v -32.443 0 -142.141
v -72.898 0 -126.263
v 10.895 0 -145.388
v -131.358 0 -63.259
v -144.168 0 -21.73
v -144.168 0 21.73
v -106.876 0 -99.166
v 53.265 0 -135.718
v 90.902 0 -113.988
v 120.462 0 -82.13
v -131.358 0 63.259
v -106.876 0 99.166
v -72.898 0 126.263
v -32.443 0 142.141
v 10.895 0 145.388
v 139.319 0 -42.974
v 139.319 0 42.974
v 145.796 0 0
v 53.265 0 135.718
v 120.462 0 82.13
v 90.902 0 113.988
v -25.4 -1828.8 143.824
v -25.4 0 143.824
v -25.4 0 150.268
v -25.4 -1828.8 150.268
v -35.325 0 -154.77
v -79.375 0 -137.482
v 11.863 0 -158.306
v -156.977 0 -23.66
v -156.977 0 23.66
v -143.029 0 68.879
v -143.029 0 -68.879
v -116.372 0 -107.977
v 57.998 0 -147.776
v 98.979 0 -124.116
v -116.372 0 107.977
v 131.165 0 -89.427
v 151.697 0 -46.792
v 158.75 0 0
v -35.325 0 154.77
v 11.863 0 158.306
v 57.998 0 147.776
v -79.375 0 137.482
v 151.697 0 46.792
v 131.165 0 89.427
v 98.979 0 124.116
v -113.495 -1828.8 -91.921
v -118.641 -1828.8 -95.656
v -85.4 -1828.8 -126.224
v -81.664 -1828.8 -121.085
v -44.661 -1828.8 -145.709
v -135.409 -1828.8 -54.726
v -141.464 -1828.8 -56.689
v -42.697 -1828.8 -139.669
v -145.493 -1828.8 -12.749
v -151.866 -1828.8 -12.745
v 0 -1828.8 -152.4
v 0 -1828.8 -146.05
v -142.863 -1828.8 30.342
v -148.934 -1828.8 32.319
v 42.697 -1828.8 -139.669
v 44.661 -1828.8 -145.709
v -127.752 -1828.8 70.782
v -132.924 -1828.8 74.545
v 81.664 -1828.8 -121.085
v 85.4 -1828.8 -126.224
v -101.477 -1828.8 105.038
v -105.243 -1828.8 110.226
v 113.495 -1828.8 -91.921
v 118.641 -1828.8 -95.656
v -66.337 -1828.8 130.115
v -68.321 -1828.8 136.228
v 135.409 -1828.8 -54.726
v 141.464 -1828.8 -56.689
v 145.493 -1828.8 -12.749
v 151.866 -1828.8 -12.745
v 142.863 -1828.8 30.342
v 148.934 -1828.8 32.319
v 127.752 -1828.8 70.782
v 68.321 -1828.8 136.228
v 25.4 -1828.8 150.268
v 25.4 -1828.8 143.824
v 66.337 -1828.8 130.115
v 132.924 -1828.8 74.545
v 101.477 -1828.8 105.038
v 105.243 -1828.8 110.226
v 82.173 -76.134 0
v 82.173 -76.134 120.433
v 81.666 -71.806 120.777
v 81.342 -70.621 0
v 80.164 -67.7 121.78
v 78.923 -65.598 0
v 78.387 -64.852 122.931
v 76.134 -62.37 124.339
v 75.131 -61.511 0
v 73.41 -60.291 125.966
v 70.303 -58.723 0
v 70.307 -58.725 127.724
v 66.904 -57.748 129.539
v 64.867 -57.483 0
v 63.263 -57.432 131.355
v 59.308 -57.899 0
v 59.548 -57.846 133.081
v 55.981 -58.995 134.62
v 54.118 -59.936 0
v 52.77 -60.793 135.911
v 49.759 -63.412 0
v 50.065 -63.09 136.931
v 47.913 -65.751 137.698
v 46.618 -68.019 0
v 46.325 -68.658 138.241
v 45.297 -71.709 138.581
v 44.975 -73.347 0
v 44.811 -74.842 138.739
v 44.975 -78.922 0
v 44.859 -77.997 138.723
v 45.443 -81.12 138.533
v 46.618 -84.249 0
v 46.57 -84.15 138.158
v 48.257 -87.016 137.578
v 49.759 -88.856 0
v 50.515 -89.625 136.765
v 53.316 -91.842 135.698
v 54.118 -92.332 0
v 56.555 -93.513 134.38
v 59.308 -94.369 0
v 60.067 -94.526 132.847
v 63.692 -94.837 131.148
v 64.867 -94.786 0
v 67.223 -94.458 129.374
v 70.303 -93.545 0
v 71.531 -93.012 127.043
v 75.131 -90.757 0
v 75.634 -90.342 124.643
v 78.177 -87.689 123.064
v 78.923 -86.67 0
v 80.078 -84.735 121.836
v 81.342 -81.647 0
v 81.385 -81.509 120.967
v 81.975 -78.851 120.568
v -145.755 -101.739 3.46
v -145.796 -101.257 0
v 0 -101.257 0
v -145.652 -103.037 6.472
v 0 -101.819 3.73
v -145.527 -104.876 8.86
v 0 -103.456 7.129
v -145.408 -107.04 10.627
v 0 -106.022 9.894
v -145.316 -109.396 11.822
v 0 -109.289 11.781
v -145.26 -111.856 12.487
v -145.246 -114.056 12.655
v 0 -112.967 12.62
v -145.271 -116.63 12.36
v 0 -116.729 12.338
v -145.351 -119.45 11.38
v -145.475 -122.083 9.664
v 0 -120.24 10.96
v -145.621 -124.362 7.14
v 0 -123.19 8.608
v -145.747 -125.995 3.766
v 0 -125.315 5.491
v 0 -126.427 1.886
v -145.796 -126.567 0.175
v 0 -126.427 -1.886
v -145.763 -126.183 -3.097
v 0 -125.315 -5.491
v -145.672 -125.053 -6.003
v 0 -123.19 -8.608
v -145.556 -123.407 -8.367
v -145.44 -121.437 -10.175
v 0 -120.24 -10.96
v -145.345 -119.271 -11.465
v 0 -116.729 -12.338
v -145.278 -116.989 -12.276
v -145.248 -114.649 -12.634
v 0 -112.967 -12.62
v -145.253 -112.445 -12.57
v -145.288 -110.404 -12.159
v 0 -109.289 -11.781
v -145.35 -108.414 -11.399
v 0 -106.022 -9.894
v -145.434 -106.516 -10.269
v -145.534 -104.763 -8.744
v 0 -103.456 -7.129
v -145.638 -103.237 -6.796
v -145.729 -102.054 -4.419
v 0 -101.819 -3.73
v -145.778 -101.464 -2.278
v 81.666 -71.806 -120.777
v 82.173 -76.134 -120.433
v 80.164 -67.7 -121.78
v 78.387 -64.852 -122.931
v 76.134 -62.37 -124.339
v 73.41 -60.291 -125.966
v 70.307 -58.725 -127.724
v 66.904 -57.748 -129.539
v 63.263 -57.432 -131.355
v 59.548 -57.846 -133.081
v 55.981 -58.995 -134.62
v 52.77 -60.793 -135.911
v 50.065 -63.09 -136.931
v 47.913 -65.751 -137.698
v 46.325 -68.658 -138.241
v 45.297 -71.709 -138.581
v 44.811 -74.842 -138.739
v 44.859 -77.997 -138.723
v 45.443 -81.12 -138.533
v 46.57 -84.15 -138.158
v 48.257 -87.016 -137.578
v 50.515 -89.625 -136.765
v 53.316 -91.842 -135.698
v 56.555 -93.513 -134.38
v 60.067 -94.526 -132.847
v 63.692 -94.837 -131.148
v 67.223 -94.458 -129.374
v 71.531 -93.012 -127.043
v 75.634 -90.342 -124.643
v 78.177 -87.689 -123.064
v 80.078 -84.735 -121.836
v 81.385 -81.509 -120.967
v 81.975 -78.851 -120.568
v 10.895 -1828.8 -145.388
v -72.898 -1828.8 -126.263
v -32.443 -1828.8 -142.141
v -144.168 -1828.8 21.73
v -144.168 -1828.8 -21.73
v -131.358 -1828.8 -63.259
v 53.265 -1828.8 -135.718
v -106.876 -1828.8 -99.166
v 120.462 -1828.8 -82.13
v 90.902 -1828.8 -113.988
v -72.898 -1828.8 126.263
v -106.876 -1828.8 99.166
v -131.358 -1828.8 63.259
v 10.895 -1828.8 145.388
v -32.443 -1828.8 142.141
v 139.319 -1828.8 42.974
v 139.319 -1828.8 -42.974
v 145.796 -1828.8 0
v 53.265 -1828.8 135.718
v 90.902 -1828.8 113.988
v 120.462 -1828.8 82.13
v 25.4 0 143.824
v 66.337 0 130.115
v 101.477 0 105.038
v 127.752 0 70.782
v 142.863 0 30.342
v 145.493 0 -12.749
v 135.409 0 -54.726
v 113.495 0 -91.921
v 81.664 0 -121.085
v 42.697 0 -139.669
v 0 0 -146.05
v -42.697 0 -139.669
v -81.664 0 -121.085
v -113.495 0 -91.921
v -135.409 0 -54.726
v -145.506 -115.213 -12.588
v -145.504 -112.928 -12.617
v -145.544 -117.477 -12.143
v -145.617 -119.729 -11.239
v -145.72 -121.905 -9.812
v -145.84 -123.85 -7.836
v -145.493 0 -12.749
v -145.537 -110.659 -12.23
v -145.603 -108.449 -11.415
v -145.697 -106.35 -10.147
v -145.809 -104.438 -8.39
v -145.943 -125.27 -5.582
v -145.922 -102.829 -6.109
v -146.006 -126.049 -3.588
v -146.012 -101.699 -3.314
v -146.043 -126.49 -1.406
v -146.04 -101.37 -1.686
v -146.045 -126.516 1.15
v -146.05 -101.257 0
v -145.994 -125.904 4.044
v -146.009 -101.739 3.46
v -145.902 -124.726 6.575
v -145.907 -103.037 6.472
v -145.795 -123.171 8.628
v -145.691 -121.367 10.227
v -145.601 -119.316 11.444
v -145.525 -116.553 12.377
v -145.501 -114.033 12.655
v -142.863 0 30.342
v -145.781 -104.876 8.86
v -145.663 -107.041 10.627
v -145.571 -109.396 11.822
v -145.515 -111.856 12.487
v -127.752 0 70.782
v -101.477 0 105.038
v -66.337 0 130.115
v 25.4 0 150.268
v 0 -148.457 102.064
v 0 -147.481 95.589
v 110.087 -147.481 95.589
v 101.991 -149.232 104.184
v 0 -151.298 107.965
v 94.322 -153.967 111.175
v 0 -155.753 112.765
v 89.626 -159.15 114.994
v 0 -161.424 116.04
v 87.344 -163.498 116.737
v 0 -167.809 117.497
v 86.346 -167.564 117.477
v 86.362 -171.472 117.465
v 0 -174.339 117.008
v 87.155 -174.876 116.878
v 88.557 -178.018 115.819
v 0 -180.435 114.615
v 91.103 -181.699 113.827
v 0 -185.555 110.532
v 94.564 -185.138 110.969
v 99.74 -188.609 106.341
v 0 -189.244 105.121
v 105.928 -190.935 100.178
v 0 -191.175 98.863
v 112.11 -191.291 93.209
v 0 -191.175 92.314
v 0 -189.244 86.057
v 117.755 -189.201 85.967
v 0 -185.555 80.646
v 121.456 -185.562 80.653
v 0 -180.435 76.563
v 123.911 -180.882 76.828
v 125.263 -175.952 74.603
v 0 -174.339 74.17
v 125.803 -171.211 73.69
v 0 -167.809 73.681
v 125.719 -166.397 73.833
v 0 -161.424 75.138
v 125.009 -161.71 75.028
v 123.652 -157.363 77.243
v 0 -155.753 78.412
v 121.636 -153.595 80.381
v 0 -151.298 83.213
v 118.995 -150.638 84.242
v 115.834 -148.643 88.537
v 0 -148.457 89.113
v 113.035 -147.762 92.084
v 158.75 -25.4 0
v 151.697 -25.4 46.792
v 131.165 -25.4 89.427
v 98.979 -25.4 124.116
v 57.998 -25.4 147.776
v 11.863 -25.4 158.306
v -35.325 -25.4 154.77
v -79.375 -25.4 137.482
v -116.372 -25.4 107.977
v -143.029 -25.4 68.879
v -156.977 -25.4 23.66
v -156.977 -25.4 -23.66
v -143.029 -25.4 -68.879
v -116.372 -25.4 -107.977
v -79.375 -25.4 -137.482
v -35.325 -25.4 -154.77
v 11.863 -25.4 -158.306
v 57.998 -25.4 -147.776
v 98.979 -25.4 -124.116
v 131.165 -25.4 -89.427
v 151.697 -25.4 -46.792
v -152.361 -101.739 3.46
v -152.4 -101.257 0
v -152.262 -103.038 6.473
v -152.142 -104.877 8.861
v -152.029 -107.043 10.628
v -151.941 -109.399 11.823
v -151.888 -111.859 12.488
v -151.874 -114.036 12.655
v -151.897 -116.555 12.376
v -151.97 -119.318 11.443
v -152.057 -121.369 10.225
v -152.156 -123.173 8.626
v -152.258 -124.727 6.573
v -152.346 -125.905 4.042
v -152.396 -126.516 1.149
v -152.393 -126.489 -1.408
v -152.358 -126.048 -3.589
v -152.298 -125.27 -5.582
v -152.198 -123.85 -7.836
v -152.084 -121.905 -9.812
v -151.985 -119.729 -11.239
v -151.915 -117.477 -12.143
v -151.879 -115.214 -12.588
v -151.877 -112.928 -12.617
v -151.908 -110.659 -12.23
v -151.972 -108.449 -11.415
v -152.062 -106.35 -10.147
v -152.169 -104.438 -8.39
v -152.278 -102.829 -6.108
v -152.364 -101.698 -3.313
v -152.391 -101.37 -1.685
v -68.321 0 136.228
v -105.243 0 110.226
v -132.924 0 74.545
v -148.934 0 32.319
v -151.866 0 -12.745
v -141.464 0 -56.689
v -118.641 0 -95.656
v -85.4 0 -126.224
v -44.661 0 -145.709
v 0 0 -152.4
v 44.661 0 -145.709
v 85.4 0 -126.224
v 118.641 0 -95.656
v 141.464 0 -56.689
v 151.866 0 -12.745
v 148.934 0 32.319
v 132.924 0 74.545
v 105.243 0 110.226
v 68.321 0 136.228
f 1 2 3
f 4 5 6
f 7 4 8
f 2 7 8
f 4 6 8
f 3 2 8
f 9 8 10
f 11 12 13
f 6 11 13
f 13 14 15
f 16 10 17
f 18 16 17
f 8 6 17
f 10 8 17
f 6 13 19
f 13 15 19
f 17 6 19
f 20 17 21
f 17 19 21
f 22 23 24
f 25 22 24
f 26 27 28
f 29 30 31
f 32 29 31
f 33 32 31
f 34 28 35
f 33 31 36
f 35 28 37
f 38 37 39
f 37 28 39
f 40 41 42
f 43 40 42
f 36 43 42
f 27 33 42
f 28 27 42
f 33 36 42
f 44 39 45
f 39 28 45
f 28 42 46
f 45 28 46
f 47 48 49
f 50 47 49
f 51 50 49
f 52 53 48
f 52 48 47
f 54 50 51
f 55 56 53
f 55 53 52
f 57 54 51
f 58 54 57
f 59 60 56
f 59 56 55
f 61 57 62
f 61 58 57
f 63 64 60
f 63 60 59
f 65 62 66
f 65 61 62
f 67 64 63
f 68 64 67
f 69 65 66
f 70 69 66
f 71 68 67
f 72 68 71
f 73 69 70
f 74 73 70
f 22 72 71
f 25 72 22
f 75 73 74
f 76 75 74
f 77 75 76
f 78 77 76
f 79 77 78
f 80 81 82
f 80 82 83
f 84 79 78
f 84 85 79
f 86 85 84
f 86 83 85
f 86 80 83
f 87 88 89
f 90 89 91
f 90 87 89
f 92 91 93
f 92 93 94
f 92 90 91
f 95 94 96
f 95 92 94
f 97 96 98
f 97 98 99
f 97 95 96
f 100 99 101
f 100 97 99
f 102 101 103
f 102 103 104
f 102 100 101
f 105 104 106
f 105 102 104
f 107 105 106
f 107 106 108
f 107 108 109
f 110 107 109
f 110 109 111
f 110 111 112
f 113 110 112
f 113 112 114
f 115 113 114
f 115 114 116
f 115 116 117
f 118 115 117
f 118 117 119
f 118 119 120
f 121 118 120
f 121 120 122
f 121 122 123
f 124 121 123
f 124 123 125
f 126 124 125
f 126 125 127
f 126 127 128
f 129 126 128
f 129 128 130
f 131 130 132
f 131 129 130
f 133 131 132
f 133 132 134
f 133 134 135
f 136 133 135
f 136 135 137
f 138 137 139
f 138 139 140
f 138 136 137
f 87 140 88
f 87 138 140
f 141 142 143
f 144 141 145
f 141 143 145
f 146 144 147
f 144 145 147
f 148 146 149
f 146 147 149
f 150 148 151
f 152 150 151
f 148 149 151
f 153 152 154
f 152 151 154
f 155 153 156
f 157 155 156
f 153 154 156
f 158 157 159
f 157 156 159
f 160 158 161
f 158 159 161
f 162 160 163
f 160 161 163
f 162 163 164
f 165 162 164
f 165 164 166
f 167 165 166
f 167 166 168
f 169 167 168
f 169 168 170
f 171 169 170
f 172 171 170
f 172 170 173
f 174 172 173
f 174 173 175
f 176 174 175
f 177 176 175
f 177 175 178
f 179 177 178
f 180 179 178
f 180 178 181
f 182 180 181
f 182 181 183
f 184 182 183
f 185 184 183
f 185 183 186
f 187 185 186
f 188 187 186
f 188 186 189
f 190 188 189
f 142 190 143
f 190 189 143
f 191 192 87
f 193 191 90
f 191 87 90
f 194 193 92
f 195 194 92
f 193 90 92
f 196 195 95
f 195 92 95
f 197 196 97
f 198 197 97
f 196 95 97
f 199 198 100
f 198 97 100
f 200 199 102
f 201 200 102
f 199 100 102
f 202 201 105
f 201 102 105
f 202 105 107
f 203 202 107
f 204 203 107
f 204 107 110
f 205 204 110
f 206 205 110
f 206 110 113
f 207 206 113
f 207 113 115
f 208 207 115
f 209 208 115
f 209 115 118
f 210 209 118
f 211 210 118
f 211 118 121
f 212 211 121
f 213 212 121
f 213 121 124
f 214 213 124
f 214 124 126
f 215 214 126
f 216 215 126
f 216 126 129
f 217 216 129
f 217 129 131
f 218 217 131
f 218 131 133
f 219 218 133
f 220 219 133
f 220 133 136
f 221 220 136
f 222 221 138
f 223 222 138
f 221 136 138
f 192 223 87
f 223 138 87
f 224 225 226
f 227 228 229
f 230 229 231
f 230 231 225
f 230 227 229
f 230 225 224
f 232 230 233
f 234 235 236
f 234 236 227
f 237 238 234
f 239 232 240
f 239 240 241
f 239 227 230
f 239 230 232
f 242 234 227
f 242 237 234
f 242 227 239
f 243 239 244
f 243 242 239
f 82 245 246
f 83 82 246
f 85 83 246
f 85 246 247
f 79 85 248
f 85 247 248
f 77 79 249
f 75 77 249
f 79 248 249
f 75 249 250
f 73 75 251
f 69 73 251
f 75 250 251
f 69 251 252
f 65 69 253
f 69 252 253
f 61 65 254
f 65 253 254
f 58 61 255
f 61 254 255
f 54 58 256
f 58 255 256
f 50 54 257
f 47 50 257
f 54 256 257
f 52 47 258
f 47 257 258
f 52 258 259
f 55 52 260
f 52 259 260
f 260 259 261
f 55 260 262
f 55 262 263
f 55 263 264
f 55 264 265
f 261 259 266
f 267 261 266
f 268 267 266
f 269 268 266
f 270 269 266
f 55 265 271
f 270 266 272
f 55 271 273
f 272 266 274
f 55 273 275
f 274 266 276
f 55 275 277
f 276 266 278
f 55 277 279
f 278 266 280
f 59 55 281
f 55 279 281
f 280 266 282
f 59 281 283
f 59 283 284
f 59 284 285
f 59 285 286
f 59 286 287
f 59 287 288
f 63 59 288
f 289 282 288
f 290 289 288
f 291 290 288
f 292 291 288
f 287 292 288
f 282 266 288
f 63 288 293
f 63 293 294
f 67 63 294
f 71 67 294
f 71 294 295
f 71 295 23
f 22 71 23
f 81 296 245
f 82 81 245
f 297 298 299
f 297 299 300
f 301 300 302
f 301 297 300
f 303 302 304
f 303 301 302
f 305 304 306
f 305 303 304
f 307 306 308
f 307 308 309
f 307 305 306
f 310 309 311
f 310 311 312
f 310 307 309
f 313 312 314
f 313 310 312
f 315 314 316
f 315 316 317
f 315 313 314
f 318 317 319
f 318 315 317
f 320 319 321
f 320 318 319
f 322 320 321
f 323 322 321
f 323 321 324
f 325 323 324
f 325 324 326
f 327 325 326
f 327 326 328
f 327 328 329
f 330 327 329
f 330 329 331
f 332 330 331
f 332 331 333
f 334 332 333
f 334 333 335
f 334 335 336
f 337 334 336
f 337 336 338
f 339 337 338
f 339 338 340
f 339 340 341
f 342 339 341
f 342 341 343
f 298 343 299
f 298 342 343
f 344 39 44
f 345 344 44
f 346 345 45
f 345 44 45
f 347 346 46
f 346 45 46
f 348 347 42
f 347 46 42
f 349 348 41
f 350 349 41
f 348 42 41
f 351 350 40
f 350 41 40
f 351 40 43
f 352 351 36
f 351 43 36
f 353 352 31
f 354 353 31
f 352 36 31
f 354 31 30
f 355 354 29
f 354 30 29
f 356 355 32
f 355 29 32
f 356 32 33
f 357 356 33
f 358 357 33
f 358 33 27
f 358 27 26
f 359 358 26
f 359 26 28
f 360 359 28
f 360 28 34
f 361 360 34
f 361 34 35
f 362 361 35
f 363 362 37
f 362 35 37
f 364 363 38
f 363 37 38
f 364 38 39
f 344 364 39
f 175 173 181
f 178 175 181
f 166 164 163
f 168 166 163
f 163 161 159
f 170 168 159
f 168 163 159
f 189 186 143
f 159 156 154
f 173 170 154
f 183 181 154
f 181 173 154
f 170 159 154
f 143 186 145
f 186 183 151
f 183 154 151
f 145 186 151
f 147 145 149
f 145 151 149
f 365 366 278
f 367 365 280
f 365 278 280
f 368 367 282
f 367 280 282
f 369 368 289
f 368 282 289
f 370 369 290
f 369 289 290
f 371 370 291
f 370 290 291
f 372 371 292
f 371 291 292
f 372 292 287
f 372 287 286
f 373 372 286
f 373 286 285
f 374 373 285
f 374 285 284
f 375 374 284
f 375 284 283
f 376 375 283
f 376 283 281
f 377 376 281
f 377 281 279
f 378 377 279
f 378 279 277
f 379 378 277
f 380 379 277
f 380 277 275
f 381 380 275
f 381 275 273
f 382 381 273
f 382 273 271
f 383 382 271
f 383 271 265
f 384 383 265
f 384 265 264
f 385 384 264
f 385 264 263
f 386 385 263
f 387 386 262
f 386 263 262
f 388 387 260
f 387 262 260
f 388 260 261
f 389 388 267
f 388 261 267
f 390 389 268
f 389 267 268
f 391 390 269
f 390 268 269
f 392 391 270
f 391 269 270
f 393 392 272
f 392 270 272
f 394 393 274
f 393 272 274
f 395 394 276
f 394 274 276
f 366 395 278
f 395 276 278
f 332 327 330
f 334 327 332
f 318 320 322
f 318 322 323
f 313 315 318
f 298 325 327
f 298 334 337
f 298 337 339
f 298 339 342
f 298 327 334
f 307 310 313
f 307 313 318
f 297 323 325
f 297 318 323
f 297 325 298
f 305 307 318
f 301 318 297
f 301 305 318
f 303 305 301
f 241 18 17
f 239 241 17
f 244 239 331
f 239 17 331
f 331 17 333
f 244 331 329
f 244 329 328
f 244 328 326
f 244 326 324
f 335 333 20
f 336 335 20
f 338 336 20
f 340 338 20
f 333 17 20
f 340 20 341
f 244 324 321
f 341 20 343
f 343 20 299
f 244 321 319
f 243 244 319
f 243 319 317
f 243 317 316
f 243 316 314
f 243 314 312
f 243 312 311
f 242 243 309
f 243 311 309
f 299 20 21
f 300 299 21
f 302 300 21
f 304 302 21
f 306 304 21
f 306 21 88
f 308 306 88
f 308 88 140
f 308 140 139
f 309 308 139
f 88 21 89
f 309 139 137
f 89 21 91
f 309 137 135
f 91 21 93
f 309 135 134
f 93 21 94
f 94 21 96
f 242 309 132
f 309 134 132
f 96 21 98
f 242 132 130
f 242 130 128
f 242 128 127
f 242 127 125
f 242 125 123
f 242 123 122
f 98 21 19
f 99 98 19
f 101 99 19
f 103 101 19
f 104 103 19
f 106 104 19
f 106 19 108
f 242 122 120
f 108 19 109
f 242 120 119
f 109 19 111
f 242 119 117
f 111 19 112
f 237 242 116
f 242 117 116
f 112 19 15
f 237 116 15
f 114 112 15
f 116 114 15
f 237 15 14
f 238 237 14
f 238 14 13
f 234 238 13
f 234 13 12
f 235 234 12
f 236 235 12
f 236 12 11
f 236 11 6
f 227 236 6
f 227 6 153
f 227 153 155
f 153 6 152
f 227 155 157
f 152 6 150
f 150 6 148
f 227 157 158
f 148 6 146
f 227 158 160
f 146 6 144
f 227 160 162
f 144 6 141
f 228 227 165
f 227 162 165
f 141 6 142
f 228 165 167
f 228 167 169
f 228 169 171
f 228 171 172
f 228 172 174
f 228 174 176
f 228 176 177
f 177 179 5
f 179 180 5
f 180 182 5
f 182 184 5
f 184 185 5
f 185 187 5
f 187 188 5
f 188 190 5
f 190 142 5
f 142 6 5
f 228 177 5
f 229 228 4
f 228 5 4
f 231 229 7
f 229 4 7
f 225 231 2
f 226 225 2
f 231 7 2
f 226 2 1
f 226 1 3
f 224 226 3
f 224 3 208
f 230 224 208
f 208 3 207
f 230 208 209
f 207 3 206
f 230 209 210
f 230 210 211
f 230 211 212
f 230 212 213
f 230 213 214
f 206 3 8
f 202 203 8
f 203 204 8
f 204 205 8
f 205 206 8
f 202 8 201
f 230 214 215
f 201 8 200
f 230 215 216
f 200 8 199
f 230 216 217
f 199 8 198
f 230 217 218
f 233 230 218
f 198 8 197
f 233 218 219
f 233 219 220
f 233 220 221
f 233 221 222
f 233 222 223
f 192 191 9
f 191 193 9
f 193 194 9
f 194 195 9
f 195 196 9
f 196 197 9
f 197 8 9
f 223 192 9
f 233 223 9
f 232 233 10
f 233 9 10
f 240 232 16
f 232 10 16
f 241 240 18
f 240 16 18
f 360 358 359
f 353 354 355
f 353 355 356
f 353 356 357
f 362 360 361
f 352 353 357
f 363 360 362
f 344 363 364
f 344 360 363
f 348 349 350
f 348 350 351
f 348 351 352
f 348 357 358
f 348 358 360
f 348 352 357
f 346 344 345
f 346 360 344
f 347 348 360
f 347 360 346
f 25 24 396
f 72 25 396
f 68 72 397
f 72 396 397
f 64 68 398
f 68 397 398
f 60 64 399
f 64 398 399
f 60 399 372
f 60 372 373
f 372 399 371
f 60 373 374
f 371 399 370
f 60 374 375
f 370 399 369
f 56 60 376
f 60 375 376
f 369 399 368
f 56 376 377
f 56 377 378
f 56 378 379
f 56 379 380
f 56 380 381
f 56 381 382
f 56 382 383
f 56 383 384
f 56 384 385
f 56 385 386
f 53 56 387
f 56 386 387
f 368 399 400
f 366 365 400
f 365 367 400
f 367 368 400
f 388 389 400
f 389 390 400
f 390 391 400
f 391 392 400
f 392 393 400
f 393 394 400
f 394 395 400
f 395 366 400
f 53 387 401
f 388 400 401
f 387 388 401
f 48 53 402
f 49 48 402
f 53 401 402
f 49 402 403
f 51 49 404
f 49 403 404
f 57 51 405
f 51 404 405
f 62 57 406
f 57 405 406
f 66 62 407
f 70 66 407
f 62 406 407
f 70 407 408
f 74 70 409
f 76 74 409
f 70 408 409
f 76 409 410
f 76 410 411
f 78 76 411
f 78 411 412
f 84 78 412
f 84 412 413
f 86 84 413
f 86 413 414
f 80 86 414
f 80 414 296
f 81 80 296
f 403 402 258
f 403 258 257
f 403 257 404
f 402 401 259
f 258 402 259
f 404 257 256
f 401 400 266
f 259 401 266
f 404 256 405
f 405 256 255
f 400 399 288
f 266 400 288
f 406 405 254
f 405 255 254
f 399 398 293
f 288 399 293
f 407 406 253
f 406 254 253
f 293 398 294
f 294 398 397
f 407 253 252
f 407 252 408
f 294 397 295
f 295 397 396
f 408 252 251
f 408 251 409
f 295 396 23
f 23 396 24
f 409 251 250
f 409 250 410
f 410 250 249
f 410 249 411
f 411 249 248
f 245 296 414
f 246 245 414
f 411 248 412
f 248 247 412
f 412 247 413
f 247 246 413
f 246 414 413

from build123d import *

# Parameters (mm, degrees)
F1_DEPTH      = 1828.8
F2_R          = 145.796
F3_DEPTH      = 1828.8
F4_R          = 18.7037822151
F5_DEPTH      = 152.401
F5_DEPTH_BACK = 150.2694264907
F6_R          = 158.75
F7_DEPTH      = 25.4
F8_R          = 21.9695909942
F9_DEPTH      = 254
F10_R         = 12.6554250347
F11_DEPTH     = 355.6


with BuildPart() as f1:
    # F0 (on Front) → F1 (new body)
    with BuildSketch(Plane.XZ):
        with BuildLine():
            Line((-25.4, 143.8243459919), (-25.4, 150.2684264907))
            ThreePointArc((-25.4, 150.2684264907), (0, -152.4), (25.4, 150.2684264907))
            Line((25.4, 150.2684264907), (25.4, 143.8243459919))
            ThreePointArc((25.4, 143.8243459919), (0, -146.05), (-25.4, 143.8243459919))
        make_face()
    extrude(amount=F1_DEPTH)


with BuildPart() as f3:
    # F2 (on Front) → F3 (new body)
    with BuildSketch(Plane.XZ):
        Circle(F2_R)
    extrude(amount=F3_DEPTH)

    # F4 (on Top) → F5 (cut, two sides)
    with BuildSketch(Plane.XY) as f5_sk:
        with Locations((63.4696483612, -76.1341750622)):
            Circle(F4_R)
    extrude(amount=-F5_DEPTH, mode=Mode.SUBTRACT)
    extrude(f5_sk.sketch, amount=F5_DEPTH_BACK, mode=Mode.SUBTRACT)

    # F8 (on Right) → F9 (cut)
    with BuildSketch(Plane.YZ):
        with Locations((-169.4504618645, 95.5888330936)):
            Circle(F8_R)
    extrude(amount=F9_DEPTH, mode=Mode.SUBTRACT)


with BuildPart() as f7:
    # F6 (on Front) → F7 (new body)
    with BuildSketch(Plane.XZ):
        Circle(F6_R)
    extrude(amount=F7_DEPTH)


with BuildPart() as f11_tool:
    # F10 (on Right) → F11 (new body)
    with BuildSketch(Plane.YZ):
        with Locations((-113.912537694, 0)):
            Circle(F10_R)
    extrude(amount=-F11_DEPTH)


with BuildPart() as f1_1:
    add(f1.part)

    # F11: cut by f11_tool
    add(f11_tool.part, mode=Mode.SUBTRACT)


with BuildPart() as f3_1:
    add(f3.part)

    # F11: cut by f11_tool
    add(f11_tool.part, mode=Mode.SUBTRACT)


solid = Compound([f7.part, f1_1.part, f3_1.part])
